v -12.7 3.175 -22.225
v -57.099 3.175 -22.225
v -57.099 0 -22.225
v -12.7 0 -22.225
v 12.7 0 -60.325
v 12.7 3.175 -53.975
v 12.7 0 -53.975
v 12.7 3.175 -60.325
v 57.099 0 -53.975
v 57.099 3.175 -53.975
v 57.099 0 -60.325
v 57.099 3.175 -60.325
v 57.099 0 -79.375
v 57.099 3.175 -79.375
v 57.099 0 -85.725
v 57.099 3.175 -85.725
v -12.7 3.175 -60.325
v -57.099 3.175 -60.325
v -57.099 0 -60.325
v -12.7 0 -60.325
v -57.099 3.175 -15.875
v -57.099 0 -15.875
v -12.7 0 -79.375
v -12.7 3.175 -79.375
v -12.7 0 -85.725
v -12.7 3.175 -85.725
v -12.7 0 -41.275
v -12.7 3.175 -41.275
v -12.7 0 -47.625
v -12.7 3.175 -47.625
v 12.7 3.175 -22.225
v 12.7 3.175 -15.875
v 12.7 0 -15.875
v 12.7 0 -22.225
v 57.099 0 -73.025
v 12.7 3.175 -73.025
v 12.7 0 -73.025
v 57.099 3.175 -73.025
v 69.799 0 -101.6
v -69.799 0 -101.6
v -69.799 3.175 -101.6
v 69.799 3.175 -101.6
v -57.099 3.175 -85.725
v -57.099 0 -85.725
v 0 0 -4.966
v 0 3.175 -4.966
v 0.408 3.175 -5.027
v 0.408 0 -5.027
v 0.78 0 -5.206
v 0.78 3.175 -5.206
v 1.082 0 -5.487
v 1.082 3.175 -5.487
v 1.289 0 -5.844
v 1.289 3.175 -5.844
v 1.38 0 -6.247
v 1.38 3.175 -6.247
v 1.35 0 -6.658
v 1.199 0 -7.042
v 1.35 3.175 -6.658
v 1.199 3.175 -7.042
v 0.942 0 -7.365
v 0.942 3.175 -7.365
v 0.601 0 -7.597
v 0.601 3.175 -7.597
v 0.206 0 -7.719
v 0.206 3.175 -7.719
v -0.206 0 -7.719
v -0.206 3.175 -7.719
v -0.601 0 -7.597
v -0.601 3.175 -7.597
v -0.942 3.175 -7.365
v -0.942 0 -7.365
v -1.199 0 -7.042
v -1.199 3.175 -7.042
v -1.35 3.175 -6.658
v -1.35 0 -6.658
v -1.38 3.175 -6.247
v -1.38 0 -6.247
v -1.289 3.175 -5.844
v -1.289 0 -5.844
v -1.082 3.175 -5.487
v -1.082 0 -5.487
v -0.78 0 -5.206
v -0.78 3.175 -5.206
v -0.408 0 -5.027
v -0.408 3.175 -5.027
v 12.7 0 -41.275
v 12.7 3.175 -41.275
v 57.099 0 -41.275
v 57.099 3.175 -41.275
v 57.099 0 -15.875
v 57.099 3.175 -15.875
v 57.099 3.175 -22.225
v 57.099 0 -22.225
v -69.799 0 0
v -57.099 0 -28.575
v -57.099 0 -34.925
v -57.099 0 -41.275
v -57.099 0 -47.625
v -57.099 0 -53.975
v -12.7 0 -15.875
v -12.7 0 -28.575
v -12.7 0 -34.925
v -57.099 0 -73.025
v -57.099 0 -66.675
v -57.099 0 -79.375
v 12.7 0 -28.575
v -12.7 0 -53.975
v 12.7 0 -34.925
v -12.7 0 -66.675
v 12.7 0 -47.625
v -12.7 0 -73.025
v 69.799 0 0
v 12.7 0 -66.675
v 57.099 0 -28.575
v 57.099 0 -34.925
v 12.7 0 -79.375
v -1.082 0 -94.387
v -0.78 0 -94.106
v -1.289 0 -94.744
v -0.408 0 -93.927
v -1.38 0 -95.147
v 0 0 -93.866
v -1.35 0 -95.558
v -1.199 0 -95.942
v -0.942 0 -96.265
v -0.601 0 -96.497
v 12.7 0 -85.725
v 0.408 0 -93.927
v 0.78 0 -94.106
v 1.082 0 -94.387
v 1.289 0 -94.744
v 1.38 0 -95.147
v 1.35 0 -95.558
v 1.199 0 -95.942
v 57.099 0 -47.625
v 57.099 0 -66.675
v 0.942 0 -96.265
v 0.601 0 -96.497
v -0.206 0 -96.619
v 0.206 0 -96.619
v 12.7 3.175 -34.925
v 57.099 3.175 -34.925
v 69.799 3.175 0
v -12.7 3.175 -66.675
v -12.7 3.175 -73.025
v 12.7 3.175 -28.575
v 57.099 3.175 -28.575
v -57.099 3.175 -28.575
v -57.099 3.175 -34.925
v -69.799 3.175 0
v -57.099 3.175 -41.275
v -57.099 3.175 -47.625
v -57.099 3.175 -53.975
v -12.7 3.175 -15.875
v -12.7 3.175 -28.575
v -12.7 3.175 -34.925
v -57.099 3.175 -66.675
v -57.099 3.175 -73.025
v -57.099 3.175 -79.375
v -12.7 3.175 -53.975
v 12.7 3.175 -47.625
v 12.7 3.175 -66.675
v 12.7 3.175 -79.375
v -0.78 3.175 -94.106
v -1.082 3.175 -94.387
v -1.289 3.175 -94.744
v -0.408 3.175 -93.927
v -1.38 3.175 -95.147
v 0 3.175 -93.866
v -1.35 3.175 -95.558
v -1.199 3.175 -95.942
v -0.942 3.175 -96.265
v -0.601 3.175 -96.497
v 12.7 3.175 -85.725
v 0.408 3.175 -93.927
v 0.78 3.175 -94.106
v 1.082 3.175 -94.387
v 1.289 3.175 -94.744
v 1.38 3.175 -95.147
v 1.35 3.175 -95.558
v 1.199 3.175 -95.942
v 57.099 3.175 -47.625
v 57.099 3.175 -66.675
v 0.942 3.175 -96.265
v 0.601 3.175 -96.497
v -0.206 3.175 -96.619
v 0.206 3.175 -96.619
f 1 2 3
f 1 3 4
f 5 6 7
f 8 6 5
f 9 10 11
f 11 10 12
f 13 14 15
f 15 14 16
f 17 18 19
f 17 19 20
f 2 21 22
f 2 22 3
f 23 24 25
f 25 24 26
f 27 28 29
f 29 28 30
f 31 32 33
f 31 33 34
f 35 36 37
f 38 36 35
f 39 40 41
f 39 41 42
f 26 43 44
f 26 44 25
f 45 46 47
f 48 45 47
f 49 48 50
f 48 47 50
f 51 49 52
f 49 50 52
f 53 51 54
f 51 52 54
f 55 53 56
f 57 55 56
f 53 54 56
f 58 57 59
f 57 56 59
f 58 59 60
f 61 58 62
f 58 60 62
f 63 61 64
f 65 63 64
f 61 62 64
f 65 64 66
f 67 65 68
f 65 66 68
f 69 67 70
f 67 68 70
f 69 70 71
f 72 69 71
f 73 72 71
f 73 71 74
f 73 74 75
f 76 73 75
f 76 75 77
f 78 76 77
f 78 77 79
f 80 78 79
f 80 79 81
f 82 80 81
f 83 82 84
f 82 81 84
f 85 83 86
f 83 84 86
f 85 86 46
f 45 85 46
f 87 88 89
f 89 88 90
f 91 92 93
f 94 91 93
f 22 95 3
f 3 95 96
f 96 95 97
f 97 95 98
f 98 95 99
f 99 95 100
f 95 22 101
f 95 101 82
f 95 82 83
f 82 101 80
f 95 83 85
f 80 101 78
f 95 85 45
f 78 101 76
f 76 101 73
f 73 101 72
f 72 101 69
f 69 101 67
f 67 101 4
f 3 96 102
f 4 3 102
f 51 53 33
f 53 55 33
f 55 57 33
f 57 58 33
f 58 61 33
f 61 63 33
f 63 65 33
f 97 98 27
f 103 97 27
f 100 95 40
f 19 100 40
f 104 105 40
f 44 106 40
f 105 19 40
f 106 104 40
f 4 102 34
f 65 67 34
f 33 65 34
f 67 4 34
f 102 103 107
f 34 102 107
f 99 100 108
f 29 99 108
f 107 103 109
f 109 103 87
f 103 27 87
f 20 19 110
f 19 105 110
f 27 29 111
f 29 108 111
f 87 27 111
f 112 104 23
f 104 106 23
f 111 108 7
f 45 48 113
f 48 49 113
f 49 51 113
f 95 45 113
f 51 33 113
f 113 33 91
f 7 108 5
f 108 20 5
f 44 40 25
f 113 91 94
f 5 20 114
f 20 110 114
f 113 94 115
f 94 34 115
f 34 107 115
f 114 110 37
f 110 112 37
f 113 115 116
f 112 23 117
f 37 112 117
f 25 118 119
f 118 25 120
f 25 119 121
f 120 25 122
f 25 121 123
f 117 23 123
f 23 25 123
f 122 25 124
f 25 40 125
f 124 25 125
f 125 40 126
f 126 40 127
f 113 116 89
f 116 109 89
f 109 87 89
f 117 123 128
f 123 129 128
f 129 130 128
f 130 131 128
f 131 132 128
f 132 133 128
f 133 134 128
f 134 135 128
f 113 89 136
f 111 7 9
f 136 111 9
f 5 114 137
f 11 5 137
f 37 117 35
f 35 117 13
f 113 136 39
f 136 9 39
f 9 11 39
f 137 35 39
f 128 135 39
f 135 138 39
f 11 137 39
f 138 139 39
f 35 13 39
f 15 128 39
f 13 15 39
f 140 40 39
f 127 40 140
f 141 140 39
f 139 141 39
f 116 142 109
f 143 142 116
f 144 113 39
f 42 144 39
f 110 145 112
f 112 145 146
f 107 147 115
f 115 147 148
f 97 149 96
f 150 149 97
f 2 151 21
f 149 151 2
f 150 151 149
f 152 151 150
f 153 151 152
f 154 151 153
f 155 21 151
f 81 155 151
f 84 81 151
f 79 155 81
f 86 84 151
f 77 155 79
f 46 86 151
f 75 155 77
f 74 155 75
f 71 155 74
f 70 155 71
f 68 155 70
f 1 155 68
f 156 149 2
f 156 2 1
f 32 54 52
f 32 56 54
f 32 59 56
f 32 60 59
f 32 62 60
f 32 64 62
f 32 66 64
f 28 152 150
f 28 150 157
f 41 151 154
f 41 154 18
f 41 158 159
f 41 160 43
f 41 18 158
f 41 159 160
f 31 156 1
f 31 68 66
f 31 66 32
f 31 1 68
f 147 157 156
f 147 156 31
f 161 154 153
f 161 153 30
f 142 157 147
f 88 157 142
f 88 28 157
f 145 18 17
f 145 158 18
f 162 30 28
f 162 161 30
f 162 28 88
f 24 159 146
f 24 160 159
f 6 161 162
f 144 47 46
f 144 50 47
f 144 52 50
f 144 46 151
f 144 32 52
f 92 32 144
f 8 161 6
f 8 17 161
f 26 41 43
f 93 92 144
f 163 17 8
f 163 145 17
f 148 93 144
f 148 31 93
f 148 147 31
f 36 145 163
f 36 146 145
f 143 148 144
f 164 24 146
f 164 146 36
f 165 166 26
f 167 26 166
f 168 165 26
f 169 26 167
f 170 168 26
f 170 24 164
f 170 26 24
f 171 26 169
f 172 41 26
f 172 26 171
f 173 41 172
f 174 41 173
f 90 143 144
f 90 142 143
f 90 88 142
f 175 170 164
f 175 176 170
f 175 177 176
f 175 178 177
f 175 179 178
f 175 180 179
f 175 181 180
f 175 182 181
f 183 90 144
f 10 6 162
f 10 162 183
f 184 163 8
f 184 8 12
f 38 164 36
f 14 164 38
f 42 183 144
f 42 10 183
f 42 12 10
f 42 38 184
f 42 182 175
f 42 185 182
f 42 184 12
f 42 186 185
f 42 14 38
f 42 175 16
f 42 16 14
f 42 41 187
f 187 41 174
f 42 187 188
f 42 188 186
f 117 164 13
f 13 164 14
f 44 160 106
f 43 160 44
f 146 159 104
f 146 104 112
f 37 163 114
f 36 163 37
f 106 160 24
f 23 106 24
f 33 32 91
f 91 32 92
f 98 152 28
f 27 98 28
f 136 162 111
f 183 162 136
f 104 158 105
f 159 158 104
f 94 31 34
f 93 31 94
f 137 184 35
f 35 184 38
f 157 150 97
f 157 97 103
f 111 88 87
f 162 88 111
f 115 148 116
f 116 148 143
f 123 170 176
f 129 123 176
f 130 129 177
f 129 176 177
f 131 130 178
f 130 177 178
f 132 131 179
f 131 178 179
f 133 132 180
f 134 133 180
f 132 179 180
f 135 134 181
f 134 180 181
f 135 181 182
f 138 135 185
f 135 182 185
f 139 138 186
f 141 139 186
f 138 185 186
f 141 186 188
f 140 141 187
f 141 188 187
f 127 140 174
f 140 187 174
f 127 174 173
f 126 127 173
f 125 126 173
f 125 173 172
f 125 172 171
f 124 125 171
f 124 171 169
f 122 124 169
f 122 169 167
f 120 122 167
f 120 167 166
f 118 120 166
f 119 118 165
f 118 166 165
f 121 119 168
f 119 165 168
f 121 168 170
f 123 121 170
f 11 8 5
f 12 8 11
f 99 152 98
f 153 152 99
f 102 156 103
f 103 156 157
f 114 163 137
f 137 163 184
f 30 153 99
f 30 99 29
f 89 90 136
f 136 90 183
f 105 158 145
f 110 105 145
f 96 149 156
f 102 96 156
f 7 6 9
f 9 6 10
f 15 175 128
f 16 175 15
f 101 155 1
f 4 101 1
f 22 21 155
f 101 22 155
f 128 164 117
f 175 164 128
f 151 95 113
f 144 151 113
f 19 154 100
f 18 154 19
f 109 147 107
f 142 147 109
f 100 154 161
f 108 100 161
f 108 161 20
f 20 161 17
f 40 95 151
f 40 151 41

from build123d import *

# Parameters (mm, degrees)
SKETCH1_W           = 139.5984
SKETCH1_H           = 101.6
BOSS_EXTRUDE1_DEPTH = 3.175
SKETCH2_R           = 1.3843
SKETCH2_W           = 44.3992
SKETCH2_H           = 6.35
CUT_EXTRUDE1_DEPTH  = 3.175


with BuildPart() as part:
    # Sketch1 → Boss-Extrude1 (new body)
    with BuildSketch(Plane(origin=(0, 0, 0), x_dir=(1, 0, 0), z_dir=(0, 1, 0))):
        with Locations((0, 50.8)):
            Rectangle(SKETCH1_W, SKETCH1_H)
    extrude(amount=BOSS_EXTRUDE1_DEPTH)

    # Sketch2 → Cut-Extrude1 (cut)
    with BuildSketch(Plane(origin=(0, 3.175, 0), x_dir=(1, 0, 0), z_dir=(0, 1, 0))):
        with Locations(Location((0, 6.35, 0), (0, 0, 270))):
            Circle(SKETCH2_R)
        with Locations(Location((0, 95.25, 0), (0, 0, 270))):
            Circle(SKETCH2_R)
        with Locations((-34.8996, 82.55)):
            Rectangle(SKETCH2_W, SKETCH2_H)
        with Locations((-34.8996, 69.85)):
            Rectangle(SKETCH2_W, SKETCH2_H)
        with Locations((-34.8996, 57.15)):
            Rectangle(SKETCH2_W, SKETCH2_H)
        with Locations((-34.8996, 44.45)):
            Rectangle(SKETCH2_W, SKETCH2_H)
        with Locations((-34.8996, 31.75)):
            Rectangle(SKETCH2_W, SKETCH2_H)
        with Locations((-34.8996, 19.05)):
            Rectangle(SKETCH2_W, SKETCH2_H)
        with Locations((34.8996, 82.55)):
            Rectangle(SKETCH2_W, SKETCH2_H)
        with Locations((34.8996, 69.85)):
            Rectangle(SKETCH2_W, SKETCH2_H)
        with Locations((34.8996, 57.15)):
            Rectangle(SKETCH2_W, SKETCH2_H)
        with Locations((34.8996, 44.45)):
            Rectangle(SKETCH2_W, SKETCH2_H)
        with Locations((34.8996, 31.75)):
            Rectangle(SKETCH2_W, SKETCH2_H)
        with Locations((34.8996, 19.05)):
            Rectangle(SKETCH2_W, SKETCH2_H)
    extrude(amount=-CUT_EXTRUDE1_DEPTH, mode=Mode.SUBTRACT)


solid = part.part
